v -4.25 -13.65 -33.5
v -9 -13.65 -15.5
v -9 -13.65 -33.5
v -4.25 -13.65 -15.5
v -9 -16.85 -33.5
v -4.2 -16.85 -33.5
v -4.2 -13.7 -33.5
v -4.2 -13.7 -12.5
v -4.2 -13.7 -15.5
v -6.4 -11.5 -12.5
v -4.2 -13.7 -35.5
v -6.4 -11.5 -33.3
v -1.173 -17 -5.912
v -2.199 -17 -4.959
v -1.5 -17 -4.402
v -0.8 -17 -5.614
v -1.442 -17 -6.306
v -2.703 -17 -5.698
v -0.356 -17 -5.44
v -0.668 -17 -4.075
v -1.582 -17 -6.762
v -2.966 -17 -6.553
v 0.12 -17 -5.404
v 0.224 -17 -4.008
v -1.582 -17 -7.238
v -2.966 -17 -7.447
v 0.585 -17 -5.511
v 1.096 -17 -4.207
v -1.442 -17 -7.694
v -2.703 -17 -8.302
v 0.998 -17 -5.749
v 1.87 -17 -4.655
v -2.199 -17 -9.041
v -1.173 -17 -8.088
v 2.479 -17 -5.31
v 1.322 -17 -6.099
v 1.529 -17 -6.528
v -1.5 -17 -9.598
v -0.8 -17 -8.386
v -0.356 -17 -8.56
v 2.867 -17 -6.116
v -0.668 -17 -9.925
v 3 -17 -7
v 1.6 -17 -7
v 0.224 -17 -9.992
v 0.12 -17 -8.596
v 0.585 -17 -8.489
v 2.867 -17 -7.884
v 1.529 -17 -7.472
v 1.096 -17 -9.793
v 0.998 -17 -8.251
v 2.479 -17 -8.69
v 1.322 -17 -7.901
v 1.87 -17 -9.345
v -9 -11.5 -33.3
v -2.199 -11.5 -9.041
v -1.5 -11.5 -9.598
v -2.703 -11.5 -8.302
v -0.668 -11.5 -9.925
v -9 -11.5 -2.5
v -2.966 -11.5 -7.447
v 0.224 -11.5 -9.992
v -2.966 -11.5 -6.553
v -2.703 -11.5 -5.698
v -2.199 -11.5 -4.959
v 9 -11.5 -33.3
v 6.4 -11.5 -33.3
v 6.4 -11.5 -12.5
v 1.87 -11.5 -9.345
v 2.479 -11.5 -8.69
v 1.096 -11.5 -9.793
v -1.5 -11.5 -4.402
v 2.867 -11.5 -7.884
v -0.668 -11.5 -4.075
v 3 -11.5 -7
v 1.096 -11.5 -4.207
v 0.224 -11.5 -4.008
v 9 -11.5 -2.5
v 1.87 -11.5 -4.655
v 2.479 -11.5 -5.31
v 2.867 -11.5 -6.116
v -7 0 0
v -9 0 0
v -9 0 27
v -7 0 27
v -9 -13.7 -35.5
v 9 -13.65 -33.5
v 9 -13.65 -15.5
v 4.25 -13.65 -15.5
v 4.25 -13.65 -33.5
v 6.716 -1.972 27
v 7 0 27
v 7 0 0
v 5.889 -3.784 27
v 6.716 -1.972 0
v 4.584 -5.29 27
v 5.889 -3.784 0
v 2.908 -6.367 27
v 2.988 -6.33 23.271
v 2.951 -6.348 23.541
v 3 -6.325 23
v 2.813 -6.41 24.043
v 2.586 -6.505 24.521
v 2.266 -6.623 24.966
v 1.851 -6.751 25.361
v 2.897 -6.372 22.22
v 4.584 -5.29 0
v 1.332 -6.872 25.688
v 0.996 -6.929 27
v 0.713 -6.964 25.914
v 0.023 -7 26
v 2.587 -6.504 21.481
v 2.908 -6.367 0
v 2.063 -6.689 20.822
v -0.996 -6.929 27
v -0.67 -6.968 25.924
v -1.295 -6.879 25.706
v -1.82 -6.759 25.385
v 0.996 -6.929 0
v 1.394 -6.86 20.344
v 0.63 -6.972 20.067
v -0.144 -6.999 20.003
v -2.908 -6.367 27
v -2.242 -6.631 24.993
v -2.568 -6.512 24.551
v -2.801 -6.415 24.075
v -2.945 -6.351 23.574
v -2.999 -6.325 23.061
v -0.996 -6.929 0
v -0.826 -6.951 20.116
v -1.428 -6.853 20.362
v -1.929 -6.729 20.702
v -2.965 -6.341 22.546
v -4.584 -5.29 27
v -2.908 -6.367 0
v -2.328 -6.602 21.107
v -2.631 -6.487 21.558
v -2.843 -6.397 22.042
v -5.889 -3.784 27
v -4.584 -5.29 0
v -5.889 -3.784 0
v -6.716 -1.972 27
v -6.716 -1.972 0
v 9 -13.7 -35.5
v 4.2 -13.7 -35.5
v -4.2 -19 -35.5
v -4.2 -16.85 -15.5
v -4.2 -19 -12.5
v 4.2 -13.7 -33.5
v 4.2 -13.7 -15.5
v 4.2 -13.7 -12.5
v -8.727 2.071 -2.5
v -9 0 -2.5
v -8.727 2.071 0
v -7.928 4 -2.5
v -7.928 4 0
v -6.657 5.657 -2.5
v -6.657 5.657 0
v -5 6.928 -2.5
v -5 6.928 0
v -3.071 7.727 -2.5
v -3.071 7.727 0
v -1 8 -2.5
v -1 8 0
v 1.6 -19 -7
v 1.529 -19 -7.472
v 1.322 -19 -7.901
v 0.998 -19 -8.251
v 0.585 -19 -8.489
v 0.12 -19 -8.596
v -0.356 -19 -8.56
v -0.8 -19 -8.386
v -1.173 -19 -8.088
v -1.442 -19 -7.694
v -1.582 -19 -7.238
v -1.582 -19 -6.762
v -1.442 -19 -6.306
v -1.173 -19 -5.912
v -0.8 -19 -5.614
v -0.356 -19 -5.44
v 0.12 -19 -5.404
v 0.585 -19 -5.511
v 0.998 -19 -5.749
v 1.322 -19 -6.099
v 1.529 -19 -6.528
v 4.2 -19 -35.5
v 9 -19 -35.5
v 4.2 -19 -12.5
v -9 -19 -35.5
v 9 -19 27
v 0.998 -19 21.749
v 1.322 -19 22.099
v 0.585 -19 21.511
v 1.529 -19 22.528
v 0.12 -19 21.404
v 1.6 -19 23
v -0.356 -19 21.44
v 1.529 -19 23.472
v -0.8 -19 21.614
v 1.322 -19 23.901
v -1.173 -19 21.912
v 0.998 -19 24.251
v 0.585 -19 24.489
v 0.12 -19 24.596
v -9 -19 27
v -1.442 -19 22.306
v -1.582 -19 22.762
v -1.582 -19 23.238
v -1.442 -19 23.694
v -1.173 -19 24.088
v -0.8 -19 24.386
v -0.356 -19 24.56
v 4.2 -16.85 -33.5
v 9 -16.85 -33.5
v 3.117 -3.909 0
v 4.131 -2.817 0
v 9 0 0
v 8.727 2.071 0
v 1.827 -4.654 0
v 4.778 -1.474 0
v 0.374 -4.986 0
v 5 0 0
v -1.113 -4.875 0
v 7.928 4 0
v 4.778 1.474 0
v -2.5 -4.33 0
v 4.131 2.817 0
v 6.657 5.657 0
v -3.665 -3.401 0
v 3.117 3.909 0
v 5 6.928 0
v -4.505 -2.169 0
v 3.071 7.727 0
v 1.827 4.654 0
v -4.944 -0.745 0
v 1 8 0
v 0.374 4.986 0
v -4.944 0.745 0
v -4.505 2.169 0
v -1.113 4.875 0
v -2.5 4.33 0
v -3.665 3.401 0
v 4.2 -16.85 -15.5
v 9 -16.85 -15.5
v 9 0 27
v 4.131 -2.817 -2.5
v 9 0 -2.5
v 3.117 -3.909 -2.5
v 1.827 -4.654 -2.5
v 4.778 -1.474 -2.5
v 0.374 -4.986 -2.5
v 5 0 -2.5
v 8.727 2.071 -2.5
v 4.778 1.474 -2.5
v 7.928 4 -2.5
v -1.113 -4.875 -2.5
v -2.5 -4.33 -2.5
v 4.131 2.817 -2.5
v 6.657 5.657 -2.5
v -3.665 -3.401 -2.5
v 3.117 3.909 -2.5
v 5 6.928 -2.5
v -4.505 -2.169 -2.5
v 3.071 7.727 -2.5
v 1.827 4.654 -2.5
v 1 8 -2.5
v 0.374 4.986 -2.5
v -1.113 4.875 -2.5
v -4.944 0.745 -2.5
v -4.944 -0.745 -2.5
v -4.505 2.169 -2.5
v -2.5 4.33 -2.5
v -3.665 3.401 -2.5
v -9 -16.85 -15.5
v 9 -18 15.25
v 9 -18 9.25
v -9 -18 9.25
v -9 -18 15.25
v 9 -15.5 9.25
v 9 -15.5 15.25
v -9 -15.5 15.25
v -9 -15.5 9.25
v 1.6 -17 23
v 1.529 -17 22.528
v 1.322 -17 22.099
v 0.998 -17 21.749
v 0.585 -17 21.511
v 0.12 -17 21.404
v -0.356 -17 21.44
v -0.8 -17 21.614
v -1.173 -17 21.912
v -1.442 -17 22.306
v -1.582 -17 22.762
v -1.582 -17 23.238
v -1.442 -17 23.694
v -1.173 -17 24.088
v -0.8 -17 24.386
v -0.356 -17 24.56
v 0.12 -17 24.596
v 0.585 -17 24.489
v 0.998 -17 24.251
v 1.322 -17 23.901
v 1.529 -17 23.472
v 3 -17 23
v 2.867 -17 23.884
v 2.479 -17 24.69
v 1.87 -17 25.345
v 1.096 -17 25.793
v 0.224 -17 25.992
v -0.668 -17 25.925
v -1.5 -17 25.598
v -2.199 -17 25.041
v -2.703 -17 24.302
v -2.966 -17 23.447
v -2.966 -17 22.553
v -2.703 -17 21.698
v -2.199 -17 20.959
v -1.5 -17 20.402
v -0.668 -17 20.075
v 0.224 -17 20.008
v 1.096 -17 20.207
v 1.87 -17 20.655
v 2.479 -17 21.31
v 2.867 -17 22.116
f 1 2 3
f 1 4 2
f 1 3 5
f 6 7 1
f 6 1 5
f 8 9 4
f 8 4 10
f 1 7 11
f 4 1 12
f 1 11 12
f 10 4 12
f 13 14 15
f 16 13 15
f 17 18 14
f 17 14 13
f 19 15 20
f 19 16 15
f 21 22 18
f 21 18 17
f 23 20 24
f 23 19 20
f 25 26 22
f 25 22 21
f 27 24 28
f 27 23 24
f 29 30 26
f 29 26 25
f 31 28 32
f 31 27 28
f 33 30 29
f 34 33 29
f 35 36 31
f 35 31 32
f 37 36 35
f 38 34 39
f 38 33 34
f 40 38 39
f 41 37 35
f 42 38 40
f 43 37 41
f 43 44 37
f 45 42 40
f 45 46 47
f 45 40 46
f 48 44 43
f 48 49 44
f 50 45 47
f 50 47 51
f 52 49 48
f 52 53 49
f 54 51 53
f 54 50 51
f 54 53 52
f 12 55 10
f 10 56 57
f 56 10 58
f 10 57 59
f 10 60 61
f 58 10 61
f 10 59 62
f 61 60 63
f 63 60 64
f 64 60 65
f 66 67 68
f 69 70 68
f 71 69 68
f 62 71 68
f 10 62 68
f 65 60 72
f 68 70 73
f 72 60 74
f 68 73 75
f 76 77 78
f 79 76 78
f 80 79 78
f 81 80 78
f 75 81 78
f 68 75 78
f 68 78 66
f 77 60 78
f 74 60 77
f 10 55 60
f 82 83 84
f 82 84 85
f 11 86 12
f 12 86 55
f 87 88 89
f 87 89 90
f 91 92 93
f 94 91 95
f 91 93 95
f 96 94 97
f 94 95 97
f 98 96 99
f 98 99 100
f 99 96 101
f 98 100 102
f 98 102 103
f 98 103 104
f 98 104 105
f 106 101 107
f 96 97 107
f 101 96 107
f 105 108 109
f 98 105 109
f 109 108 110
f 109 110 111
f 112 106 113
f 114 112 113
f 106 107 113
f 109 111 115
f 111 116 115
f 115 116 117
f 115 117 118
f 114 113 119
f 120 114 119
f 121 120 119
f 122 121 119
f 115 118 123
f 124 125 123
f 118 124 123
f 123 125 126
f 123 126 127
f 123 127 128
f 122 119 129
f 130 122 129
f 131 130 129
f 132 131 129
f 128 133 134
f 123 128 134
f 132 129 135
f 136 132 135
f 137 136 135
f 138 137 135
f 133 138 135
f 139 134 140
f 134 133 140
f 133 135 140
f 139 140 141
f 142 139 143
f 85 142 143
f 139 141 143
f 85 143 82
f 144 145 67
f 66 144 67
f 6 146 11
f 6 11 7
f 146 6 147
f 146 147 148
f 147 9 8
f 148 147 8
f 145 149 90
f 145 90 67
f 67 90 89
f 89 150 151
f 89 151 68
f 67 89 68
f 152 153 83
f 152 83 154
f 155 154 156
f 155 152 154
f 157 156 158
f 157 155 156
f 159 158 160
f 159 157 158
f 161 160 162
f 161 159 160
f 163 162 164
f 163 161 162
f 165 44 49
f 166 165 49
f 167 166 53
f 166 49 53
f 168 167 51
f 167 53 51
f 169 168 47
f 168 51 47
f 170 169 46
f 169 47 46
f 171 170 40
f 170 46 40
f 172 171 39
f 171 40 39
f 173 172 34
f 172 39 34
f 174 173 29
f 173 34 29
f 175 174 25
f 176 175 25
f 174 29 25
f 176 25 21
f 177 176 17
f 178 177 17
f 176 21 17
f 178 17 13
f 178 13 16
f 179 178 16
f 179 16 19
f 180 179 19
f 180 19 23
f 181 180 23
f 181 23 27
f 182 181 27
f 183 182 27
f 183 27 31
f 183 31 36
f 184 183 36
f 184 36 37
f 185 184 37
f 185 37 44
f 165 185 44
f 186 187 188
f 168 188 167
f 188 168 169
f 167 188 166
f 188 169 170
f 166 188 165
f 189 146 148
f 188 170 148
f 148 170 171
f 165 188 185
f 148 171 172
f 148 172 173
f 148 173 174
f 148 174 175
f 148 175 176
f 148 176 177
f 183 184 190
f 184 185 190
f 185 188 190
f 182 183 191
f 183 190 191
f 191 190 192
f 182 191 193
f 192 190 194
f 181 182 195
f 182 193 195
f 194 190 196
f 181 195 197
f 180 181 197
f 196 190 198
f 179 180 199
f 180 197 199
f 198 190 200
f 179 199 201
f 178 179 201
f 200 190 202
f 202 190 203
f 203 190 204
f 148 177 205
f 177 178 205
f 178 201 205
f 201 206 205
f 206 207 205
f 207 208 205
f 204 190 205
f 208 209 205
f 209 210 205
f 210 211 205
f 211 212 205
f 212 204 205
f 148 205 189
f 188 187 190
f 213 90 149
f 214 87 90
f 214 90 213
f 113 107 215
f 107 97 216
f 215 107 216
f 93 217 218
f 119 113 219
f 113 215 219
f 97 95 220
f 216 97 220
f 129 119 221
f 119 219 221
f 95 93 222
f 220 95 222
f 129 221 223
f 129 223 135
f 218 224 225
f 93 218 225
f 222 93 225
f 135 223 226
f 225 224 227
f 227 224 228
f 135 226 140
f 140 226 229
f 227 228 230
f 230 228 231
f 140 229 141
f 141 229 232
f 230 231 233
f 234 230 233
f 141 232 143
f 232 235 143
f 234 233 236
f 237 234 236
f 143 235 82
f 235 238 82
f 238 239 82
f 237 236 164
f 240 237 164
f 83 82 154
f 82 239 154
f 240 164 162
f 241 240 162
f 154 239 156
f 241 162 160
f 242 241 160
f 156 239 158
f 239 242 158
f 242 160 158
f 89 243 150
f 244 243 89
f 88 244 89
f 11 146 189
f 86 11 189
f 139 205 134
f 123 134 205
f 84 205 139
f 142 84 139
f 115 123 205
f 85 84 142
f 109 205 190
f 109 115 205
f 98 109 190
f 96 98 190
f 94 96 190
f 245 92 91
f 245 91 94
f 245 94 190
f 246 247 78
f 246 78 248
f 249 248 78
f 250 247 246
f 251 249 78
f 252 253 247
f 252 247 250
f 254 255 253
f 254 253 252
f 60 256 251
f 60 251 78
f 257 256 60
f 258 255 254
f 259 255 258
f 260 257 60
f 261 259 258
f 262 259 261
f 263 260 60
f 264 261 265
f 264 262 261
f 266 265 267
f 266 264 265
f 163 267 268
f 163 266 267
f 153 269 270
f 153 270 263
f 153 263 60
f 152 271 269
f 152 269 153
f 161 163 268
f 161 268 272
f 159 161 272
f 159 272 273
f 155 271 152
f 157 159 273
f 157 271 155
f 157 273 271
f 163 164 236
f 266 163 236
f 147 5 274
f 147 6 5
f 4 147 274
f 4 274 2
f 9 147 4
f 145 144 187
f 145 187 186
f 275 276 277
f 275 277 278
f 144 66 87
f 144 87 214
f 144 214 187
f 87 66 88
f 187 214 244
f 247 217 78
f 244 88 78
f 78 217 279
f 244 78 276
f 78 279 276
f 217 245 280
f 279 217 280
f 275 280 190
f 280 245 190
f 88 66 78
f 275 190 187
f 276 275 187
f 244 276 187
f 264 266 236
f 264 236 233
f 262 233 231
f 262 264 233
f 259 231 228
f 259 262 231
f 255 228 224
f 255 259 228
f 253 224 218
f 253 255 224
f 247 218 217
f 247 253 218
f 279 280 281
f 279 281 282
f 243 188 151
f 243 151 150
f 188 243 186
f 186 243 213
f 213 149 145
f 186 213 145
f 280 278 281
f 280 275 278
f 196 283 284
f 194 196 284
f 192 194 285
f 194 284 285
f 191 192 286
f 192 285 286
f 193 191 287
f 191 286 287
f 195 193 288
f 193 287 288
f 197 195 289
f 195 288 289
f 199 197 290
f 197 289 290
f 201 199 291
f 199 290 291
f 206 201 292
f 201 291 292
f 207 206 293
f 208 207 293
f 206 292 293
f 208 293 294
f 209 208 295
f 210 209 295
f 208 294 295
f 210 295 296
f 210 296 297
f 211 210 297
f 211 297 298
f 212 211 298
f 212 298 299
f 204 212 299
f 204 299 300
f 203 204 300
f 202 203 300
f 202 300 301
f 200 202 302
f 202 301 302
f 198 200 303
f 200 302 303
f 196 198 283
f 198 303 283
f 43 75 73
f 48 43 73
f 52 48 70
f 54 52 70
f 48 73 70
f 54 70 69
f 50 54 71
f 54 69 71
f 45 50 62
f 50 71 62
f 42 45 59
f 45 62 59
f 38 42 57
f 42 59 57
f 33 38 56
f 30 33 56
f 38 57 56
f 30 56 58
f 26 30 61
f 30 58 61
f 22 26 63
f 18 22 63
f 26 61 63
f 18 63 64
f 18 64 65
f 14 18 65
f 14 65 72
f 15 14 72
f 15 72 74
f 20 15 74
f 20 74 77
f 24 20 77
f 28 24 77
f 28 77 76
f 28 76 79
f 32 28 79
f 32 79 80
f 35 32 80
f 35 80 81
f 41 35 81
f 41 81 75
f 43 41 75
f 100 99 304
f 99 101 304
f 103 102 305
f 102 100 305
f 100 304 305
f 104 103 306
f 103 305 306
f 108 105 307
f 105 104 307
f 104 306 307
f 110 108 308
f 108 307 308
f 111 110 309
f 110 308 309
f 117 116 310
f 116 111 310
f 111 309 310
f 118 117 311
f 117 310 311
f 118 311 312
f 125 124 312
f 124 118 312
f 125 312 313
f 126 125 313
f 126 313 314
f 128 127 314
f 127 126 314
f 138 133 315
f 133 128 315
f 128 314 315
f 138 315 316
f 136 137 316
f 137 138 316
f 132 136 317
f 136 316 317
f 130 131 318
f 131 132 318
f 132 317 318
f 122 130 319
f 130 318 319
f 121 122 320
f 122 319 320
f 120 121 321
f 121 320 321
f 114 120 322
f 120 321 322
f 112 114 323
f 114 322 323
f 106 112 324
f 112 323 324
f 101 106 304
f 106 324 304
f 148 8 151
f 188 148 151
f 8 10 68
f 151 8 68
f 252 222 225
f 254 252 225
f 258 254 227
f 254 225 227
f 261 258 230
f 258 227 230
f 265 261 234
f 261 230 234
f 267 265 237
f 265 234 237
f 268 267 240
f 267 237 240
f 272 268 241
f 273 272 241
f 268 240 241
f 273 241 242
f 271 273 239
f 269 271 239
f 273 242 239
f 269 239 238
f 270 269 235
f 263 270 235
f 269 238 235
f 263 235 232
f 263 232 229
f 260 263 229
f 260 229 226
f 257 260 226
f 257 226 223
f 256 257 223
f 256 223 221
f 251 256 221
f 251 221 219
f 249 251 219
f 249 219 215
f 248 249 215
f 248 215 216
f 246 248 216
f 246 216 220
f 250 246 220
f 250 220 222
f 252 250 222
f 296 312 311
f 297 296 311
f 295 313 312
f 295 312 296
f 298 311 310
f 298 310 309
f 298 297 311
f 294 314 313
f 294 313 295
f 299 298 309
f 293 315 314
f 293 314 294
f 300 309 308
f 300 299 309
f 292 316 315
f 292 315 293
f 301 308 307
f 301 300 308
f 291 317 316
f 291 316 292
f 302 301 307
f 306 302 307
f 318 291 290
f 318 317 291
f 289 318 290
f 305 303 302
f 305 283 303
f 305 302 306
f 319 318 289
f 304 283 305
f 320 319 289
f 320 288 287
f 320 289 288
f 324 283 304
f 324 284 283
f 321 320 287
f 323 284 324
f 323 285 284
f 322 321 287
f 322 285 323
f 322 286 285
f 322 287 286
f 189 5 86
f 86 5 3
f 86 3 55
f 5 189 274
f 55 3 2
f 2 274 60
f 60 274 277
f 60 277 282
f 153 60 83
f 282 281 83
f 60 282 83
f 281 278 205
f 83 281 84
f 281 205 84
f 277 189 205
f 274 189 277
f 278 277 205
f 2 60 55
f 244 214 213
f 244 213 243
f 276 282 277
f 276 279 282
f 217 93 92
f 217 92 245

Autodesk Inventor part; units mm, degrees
ref_plane "YZ Plane" through (0, 0, 0) normal (1, 0, 0) x (0, 1, 0)
ref_plane "XZ Plane" through (0, 0, 0) normal (0, 1, 0) x (-1, 0, 0)
ref_plane "XY Plane" through (0, 0, 0) normal (0, 0, 1) x (1, 0, 0)
sketch "Sketch1" plane through (0, 0, 0) normal (0, 0, 1) x (1, 0, 0)
  circle A0 centre (0, 0) radius 7
  circle A1 centre (0, 0) radius 5
  circle A2 centre (0, 0) radius 1
  line L0 (-9, 0) -> (9, 0)
  line L1 (9, 0) -> (9, -19)
  line L2 (9, -19) -> (-9, -19)
  line L3 (-9, -19) -> (-9, 0)
  dimension "d11" = 14
  dimension "d12" = 10
  dimension "d13" = 2
  dimension "d18" = 19
  dimension "d19" = 18
extrude "Extrusion1" add sketch "Sketch1" along normal blind 27 contours L0 L1 L2 L3 A0 | A0 L0 A1 | A1 L0 A2 | A2 L0 picked at (6.2655, -0.5584) picked at (3.6182, -0.3989) picked at (-0.2952, -0.1549)
sketch "Sketch3" plane through (0, 0, 0) normal (0, 0, -1) x (-1, 0, 0)
  line L0 (9, -19) -> (9, 0) projected
  line L1 (-9, -19) -> (9, -19)
  line L2 (9, -19) -> (9, 8)
  line L3 (9, 8) -> (-9, 8)
  line L4 (-9, 8) -> (-9, -19)
  dimension "d22" = 27
extrude "Extrusion6" add sketch "Sketch3" along normal blind 2.5
extrude "Extrusion5" cut sketch "Sketch1" along normal blind 30 contours L0 A1 A0 | A0 L0 A1 | L0 A2 A1 | A1 L0 A2 | L0 A2 | A2 L0
extrude "Extrusion7" cut sketch "Sketch1" against normal through all contours L0 A2 A1 | A1 L0 A2 | L0 A2 | A2 L0
fillet "Fillet1" radius 8 2 edges at (-9, 8, -1.25) (9, 8, -1.25)
sketch "Sketch4" plane through (9, -19, 27) normal (1, 0, 0) x (0, 0, -1)
  line L0 (0, 0) -> (29.5, 0) projected
  line L1 (11.75, 3.5) -> (17.75, 3.5)
  line L2 (17.75, 3.5) -> (17.75, 1)
  line L3 (17.75, 1) -> (11.75, 1)
  line L4 (11.75, 1) -> (11.75, 3.5)
  point P0 (14.75, 0)
  point P1 (14.75, 1)
  dimension "d32" = 6
  dimension "d33" = 2.5
  dimension "d34" = 1
extrude "Extrusion8" cut sketch "Sketch4" against normal through all
sketch "Sketch5" plane through (0, 0, -2.5) normal (0, 0, -1) x (-1, 0, 0)
  line L0 (9, -19) -> (9, 0) projected
  line L1 (-9, -19) -> (9, -19)
  line L2 (9, -19) -> (9, -11.5)
  line L3 (9, -11.5) -> (-9, -11.5)
  line L4 (-9, -11.5) -> (-9, -19)
  dimension "d37" = 7.5
extrude "Extrusion9" add sketch "Sketch5" along normal blind 33
sketch "Sketch6" plane through (-9, -11.5, -2.5) normal (0, 1, 0) x (1, 0, 0)
  line L0 (4.8, 10) -> (13.2, 10)
  line L1 (13.2, 10) -> (13.2, 33)
  line L2 (13.2, 33) -> (4.8, 33)
  line L3 (4.8, 33) -> (4.8, 10)
  line L4 (0, 33) -> (18, 33) projected
  point P0 (9, -2.5)
  point P1 (9, 33)
  point P2 (9, 33)
  dimension "d45" = 23
  dimension "d47" = 0
  dimension "d69" = 8.4
extrude "Extrusion10" cut sketch "Sketch6" against normal blind 30
sketch "Sketch7" plane through (9, -19, 27) normal (1, 0, 0) x (0, 0, -1)
  line L0 (42.5, 5.35) -> (60.5, 5.35)
  line L1 (60.5, 5.35) -> (60.5, 2.15)
  line L2 (60.5, 2.15) -> (42.5, 2.15)
  line L3 (42.5, 2.15) -> (42.5, 5.35)
  line L4 (62.5, 7.5) -> (62.5, 0) projected
  line L5 (62.5, 7.5) -> (39.5, 7.5) projected
  point P0 (27, 19)
  point P1 (60.5, 3.75)
  point P2 (62.5, 3.75)
  point P3 (51.5, 5.35)
  point P4 (51, 7.5)
  point P5 (59.5, 7.5)
  dimension "d49" = 3.2
  dimension "d55" = 18
  dimension "d70" = 20
extrude "Extrusion11" cut sketch "Sketch7" against normal through all
sketch "Sketch8" plane through (-9, -11.5, -2.5) normal (0, 1, 0) x (1, 0, 0)
  circle A0 centre (9, 4.5) radius 3
  circle A1 centre (9, -25.5) radius 3
  line L0 (16, -29.5) -> (2, -29.5) projected
  point P0 (9, -2.5)
  dimension "d56" = 6
  dimension "d57" = 6
  dimension "d58" = 4
  dimension "d59" = 34
extrude "Extrusion12" cut sketch "Sketch8" along normal mid plane 11
sketch "Sketch9" plane through (0, -17, -7) normal (0, 1, 0) x (1, 0, 0)
  circle A0 centre (0, 0) radius 3 projected
  circle A1 centre (0, 0) radius 1.6
  circle A2 centre (0, -30) radius 1.6
  point P0 (0, -7)
  dimension "d62" = 3.2
  dimension "d63" = 3.2
extrude "Extrusion13" cut sketch "Sketch9" against normal through all contours A1 | A2
chamfer "Chamfer2" distance 2.2 angle 45 4 edges at (4.2, -11.5, -24) (-4.2, -11.5, -24) (6.6, -11.5, -35.5) (-6.6, -11.5, -35.5)
properties part number "Solinoid holder v5"
